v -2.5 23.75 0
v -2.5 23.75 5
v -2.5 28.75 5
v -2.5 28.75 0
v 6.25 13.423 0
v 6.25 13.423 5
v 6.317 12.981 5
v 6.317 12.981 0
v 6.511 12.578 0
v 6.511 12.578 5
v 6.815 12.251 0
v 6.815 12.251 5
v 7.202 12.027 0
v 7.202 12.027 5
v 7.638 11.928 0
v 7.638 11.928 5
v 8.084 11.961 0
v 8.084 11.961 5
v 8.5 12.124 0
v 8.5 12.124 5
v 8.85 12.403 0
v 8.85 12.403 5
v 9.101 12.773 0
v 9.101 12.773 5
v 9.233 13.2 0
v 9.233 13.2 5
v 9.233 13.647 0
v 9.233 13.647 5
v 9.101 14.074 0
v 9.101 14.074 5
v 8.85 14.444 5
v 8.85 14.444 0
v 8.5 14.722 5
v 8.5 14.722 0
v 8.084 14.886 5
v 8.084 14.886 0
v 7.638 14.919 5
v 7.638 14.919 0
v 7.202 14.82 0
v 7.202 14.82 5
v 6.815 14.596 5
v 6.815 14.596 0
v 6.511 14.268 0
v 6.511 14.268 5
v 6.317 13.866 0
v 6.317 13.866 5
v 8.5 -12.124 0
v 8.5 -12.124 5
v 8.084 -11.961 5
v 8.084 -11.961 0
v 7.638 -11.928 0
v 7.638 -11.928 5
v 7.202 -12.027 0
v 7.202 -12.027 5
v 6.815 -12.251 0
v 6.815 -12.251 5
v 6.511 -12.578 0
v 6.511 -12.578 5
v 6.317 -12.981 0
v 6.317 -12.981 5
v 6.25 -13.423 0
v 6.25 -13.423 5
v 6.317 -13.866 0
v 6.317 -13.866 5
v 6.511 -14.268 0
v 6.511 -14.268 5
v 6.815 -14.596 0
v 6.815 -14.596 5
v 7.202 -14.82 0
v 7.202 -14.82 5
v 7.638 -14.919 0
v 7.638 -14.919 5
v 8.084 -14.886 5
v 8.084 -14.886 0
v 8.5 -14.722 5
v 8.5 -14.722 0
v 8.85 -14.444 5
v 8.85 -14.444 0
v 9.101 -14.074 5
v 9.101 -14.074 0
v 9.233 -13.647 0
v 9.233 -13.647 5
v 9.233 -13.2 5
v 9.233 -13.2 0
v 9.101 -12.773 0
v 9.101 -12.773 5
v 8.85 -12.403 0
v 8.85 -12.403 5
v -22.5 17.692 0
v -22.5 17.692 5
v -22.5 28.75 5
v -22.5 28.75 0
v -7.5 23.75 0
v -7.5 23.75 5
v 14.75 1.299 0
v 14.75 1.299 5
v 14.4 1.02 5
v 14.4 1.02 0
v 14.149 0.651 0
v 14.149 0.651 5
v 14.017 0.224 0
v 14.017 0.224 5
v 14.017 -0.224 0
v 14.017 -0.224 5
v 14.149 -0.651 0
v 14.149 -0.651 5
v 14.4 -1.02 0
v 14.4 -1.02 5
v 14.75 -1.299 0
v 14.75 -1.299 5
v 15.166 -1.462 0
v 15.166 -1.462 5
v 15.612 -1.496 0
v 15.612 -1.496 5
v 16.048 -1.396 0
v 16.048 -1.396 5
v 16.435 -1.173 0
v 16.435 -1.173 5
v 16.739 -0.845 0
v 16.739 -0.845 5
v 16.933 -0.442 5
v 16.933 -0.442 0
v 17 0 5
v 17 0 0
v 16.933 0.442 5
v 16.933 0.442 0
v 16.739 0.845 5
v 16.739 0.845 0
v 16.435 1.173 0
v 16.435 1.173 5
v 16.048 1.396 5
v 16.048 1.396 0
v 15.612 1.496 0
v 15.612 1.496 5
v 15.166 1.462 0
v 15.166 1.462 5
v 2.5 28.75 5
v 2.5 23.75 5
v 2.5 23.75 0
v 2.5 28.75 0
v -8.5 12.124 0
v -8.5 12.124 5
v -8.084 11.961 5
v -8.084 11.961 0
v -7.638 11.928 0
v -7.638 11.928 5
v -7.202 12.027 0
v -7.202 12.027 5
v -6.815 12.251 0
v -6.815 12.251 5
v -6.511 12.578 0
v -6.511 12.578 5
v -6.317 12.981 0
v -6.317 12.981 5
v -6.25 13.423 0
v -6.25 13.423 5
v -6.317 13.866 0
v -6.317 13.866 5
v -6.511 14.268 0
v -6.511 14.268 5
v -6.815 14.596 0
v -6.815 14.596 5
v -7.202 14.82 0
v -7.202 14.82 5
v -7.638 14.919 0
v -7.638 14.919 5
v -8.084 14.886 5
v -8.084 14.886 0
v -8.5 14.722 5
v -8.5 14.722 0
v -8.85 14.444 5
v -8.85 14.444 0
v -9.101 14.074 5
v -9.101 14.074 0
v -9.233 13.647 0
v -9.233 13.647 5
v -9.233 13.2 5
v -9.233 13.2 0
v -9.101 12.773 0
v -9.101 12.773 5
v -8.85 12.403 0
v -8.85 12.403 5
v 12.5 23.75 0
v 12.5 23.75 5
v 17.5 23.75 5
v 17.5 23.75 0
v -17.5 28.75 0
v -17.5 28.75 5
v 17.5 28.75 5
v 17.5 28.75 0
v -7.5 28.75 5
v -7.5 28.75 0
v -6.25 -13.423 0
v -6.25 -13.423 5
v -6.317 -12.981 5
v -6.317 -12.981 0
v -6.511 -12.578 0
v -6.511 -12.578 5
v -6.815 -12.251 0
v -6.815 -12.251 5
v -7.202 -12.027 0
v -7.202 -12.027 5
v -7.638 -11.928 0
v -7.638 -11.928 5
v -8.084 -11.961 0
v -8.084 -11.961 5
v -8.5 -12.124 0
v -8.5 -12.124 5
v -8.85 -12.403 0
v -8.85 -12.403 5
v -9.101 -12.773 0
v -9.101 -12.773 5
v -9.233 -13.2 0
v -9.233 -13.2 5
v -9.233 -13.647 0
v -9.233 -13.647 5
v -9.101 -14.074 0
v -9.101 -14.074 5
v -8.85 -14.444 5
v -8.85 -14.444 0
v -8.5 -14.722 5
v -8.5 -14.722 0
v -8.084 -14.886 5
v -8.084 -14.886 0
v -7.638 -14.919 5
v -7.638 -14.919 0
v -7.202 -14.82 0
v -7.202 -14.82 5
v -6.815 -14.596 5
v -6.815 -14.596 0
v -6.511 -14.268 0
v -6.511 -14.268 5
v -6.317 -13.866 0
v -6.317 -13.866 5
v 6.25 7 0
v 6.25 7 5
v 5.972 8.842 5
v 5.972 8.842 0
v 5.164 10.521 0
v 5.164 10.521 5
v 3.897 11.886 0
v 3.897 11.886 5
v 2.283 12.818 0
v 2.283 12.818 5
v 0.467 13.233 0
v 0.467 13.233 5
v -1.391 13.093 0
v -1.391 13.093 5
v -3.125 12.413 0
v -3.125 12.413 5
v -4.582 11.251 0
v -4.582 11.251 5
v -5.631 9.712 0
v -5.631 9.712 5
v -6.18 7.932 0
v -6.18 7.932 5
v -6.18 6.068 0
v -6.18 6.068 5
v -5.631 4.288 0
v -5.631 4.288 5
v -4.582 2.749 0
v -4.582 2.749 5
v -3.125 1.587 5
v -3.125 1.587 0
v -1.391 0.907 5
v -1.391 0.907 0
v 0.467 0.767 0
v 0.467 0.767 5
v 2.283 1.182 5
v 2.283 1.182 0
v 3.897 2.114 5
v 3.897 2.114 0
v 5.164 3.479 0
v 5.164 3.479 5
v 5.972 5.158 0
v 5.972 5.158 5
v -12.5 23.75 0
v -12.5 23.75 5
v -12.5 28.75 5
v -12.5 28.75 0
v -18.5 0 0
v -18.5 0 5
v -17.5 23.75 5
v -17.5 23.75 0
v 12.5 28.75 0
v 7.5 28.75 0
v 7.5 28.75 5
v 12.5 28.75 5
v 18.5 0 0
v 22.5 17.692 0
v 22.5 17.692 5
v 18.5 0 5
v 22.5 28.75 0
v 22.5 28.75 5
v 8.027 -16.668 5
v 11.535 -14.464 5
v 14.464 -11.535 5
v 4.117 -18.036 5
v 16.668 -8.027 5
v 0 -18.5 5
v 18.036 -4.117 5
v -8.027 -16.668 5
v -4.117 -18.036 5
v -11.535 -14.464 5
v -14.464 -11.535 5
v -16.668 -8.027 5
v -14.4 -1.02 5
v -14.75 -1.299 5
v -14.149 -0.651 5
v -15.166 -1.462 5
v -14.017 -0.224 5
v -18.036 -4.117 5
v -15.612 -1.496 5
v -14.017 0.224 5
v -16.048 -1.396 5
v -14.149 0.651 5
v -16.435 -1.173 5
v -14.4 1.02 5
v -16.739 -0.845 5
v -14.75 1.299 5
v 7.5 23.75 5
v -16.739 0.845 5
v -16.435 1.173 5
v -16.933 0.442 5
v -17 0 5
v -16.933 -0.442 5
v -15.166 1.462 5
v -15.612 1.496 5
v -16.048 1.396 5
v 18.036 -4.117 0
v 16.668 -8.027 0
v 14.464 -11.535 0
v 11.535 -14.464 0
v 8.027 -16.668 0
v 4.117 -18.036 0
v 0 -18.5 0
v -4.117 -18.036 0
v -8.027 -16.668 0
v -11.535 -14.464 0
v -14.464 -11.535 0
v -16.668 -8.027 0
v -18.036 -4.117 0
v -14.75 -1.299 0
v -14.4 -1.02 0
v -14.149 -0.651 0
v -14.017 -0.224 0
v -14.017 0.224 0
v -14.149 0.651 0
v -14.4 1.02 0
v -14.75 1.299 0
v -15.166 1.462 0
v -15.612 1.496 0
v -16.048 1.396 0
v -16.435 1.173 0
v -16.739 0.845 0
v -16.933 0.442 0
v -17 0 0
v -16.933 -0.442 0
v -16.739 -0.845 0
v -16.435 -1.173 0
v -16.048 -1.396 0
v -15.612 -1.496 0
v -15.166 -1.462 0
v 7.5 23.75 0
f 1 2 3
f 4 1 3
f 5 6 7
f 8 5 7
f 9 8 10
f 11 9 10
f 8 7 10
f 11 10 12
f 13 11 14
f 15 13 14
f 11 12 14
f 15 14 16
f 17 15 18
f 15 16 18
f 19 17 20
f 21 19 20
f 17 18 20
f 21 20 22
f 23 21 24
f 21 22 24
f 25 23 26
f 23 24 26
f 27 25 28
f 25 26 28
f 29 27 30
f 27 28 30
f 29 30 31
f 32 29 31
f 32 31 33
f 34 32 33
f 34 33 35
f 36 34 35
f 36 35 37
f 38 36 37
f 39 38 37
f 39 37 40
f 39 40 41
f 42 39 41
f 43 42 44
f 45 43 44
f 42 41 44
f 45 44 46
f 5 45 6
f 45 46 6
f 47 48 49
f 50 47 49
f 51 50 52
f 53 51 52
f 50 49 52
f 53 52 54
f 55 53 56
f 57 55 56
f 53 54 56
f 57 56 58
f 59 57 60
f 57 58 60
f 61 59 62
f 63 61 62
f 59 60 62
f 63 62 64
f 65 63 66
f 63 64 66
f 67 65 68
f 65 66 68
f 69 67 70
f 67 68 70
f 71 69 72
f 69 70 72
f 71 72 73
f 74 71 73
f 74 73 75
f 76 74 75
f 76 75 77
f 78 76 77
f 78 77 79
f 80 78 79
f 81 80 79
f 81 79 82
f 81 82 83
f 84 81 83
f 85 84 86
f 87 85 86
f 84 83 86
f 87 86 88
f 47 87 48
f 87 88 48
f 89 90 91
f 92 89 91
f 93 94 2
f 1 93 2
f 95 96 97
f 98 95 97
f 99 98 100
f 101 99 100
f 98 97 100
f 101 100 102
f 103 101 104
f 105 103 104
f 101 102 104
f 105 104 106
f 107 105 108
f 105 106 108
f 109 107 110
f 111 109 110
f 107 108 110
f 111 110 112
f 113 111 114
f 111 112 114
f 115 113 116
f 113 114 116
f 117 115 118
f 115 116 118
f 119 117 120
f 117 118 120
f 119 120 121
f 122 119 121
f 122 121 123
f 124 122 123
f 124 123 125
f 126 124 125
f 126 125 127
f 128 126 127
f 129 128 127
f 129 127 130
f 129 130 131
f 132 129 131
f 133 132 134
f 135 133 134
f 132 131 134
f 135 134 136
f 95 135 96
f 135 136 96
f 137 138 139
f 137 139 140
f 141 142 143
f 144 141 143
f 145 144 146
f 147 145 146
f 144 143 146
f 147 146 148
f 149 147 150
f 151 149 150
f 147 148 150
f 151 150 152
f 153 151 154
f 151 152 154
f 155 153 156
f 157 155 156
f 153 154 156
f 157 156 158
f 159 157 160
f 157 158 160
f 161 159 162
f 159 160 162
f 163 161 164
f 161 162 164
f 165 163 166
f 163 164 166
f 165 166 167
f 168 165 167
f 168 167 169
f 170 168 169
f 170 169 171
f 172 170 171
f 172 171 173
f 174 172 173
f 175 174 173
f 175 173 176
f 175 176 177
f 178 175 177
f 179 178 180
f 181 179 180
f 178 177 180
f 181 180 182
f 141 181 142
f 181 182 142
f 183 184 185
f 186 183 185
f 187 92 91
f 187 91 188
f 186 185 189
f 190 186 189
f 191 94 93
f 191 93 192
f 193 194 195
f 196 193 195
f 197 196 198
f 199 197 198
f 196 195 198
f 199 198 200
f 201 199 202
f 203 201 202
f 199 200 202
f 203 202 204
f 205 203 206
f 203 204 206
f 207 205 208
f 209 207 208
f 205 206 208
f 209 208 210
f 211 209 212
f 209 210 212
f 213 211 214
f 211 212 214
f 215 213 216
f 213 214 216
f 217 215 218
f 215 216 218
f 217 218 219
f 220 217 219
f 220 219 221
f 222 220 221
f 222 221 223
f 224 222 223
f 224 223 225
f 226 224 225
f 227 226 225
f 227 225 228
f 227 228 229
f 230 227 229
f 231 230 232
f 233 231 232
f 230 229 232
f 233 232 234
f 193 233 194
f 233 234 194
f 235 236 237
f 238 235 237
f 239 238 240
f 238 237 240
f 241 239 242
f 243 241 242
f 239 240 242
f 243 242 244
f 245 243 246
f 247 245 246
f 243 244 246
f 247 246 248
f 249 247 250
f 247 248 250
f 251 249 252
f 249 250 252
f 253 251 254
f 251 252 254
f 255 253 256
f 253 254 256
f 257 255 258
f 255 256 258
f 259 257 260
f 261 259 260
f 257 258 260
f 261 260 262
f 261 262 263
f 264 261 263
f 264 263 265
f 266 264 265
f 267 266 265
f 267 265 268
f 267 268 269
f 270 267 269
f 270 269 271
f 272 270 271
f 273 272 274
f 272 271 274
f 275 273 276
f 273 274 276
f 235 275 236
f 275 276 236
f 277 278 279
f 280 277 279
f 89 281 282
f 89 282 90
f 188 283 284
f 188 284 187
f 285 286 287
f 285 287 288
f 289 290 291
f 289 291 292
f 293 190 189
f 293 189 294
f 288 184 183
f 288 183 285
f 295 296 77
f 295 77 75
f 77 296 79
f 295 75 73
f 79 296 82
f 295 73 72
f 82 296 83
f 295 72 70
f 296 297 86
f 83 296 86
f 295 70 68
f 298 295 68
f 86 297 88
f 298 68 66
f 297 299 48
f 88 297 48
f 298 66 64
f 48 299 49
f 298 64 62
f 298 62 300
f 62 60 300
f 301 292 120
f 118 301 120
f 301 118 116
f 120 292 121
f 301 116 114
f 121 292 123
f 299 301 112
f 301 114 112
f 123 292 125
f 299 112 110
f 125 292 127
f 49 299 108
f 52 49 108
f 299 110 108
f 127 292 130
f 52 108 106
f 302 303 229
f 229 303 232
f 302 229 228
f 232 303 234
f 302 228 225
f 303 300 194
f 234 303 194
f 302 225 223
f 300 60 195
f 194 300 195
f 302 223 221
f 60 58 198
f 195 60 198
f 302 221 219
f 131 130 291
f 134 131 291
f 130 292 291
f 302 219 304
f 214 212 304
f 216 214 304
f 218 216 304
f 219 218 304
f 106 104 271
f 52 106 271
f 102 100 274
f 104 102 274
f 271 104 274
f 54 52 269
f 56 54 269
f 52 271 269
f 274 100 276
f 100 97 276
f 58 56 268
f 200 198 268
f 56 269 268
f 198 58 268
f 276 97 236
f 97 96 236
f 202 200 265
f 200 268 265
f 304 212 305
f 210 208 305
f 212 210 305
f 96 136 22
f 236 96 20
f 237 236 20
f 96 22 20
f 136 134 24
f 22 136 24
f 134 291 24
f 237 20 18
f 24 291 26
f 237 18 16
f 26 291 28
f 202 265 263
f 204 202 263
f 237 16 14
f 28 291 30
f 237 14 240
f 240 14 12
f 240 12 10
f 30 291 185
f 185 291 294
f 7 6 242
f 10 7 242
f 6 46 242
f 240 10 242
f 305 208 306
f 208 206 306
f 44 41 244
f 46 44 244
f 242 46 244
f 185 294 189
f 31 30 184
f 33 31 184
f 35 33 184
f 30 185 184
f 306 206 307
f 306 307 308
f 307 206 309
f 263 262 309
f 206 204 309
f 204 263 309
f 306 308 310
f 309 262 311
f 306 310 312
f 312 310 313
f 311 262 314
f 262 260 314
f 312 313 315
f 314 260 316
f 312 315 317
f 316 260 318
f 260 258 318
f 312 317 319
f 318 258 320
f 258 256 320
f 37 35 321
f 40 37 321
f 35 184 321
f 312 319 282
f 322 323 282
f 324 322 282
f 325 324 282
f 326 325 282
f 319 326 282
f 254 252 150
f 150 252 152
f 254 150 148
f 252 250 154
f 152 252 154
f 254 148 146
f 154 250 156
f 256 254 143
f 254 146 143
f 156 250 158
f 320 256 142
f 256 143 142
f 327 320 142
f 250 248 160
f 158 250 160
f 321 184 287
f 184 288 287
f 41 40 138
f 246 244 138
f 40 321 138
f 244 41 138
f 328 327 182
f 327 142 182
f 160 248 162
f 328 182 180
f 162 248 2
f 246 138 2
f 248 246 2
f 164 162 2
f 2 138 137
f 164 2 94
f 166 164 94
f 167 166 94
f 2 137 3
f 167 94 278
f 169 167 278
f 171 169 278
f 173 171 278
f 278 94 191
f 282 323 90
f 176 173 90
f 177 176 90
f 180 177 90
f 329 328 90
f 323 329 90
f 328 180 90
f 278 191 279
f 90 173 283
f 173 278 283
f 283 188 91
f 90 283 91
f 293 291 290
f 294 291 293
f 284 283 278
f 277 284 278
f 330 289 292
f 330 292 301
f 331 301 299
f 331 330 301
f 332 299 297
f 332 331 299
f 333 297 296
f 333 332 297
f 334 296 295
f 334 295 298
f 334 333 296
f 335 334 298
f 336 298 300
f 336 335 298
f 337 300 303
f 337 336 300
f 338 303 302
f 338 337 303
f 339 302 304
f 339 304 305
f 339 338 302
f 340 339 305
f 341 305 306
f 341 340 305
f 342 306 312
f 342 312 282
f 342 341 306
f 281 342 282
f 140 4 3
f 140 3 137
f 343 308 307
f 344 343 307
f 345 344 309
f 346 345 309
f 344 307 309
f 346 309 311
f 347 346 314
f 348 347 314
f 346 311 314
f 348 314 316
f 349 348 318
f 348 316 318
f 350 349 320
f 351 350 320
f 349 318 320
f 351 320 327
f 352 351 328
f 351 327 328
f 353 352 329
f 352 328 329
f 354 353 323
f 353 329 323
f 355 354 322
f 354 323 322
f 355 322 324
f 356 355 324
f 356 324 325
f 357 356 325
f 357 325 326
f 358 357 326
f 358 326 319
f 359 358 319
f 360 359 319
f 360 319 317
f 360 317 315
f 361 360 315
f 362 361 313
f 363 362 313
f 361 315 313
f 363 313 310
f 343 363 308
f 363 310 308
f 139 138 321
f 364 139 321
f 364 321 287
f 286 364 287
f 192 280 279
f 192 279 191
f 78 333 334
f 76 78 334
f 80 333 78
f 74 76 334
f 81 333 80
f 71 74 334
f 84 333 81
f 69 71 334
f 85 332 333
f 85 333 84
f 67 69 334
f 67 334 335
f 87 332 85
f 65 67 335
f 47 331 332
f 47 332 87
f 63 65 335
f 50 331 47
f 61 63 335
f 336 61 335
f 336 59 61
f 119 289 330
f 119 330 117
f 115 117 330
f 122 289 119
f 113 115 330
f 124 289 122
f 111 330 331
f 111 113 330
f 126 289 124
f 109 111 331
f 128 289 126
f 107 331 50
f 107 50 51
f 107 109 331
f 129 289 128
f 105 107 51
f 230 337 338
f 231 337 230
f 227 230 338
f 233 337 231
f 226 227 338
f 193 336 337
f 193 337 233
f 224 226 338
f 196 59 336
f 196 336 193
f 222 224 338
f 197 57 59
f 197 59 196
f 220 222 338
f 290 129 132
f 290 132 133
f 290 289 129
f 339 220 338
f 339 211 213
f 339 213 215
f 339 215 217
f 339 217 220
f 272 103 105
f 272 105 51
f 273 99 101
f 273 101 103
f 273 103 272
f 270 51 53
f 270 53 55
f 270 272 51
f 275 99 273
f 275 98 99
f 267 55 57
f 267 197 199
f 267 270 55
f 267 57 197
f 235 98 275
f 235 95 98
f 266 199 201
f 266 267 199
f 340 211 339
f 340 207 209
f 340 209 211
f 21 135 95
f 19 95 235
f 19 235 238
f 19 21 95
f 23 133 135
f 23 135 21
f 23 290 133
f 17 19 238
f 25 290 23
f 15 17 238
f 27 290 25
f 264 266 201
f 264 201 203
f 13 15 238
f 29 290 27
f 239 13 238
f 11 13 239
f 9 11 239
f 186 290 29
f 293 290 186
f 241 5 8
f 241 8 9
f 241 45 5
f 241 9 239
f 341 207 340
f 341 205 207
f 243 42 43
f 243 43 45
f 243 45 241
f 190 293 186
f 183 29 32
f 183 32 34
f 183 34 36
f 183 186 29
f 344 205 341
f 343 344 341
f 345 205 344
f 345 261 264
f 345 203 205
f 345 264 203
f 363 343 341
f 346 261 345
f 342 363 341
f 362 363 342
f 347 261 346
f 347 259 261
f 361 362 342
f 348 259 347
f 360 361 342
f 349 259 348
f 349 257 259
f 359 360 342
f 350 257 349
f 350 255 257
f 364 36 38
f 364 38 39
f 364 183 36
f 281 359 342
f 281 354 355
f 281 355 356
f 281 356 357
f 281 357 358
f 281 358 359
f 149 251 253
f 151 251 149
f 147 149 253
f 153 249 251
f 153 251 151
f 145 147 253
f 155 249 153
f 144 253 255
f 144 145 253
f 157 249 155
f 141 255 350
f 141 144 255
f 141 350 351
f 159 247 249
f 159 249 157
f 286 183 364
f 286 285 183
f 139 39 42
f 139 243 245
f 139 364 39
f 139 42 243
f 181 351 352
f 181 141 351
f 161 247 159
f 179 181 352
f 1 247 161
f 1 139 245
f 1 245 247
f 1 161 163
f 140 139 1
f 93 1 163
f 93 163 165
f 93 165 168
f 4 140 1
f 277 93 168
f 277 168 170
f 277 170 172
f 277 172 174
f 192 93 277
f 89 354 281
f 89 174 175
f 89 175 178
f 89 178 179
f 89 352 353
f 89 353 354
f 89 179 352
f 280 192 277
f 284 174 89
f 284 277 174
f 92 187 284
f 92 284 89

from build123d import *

# Parameters (mm, degrees)
BOSS_EXTRU_2_DEPTH           = 5
ESQUISSE2_R                  = 1.5
ENL_V_MAT_EXTRU_1_DEPTH      = 5
R_P_TITION_CIRCULAIRE1_COUNT = 6
ESQUISSE3_R                  = 6.25
ENL_V_MAT_EXTRU_2_DEPTH      = 5
ESQUISSE4_W                  = 5
ESQUISSE4_H                  = 5
ENL_V_MAT_EXTRU_3_DEPTH      = 10
R_P_TITION_LIN_AIRE1_COUNT   = 4
R_P_TITION_LIN_AIRE1_PITCH   = 10
ESQUISSE5_W                  = 11.156910716
ESQUISSE5_H                  = 32.673754016
ESQUISSE5_W_2                = 16.593305943
ENL_V_MAT_EXTRU_4_DEPTH      = 10


with BuildPart() as part:
    # Esquisse1 → Boss.-Extru.2 (new body)
    with BuildSketch(Plane.XY):
        with BuildLine():
            ThreePointArc((18.5, 0), (0, -18.5), (-18.5, 0))
            Line((-18.5, 0), (-25, 28.75))
            Line((-25, 28.75), (25, 28.75))
            Line((25, 28.75), (18.5, 0))
        make_face()
    extrude(amount=BOSS_EXTRU_2_DEPTH)

    # Esquisse2 → Enlèv. mat.-Extru.1 (cut)
    with BuildSketch(Plane.XY.offset(5)):
        with Locations((-7.75, -13.423393759)):
            Circle(ESQUISSE2_R)
    enl_v_mat_extru_1 = extrude(amount=-ENL_V_MAT_EXTRU_1_DEPTH, mode=Mode.SUBTRACT)

    # Répétition circulaire1: Enlèv. mat.-Extru.1 ×6 about axis
    r_p_tition_circulaire1_axis = Axis((0, 0, 0), (0, 0, 1))
    for i in range(1, R_P_TITION_CIRCULAIRE1_COUNT):
        add(enl_v_mat_extru_1.rotate(r_p_tition_circulaire1_axis, i * 360 / R_P_TITION_CIRCULAIRE1_COUNT), mode=Mode.SUBTRACT)

    # Esquisse3 → Enlèv. mat.-Extru.2 (cut)
    with BuildSketch(Plane.XY.offset(5)):
        with Locations((0, 7)):
            Circle(ESQUISSE3_R)
    extrude(amount=-ENL_V_MAT_EXTRU_2_DEPTH, mode=Mode.SUBTRACT)

    # Esquisse4 → Enlèv. mat.-Extru.3 (cut)
    with BuildSketch(Plane.XY.offset(5)):
        with Locations((-15, 26.25)):
            Rectangle(ESQUISSE4_W, ESQUISSE4_H)
    enl_v_mat_extru_3 = extrude(amount=-ENL_V_MAT_EXTRU_3_DEPTH, mode=Mode.SUBTRACT)

    # Répétition linéaire1: Enlèv. mat.-Extru.3 ×4
    with Locations(*[(i * R_P_TITION_LIN_AIRE1_PITCH, 0, 0) for i in range(1, R_P_TITION_LIN_AIRE1_COUNT)]):
        add(enl_v_mat_extru_3, mode=Mode.SUBTRACT)

    # Esquisse5 → Enlèv. mat.-Extru.4 (cut)
    with BuildSketch(Plane.XY.offset(5)):
        with Locations((28.078455358, 23.582495232)):
            Rectangle(ESQUISSE5_W, ESQUISSE5_H)
        with Locations((-30.796652972, 23.582495232)):
            Rectangle(ESQUISSE5_W_2, ESQUISSE5_H)
    extrude(amount=-ENL_V_MAT_EXTRU_4_DEPTH, mode=Mode.SUBTRACT)


solid = part.part
